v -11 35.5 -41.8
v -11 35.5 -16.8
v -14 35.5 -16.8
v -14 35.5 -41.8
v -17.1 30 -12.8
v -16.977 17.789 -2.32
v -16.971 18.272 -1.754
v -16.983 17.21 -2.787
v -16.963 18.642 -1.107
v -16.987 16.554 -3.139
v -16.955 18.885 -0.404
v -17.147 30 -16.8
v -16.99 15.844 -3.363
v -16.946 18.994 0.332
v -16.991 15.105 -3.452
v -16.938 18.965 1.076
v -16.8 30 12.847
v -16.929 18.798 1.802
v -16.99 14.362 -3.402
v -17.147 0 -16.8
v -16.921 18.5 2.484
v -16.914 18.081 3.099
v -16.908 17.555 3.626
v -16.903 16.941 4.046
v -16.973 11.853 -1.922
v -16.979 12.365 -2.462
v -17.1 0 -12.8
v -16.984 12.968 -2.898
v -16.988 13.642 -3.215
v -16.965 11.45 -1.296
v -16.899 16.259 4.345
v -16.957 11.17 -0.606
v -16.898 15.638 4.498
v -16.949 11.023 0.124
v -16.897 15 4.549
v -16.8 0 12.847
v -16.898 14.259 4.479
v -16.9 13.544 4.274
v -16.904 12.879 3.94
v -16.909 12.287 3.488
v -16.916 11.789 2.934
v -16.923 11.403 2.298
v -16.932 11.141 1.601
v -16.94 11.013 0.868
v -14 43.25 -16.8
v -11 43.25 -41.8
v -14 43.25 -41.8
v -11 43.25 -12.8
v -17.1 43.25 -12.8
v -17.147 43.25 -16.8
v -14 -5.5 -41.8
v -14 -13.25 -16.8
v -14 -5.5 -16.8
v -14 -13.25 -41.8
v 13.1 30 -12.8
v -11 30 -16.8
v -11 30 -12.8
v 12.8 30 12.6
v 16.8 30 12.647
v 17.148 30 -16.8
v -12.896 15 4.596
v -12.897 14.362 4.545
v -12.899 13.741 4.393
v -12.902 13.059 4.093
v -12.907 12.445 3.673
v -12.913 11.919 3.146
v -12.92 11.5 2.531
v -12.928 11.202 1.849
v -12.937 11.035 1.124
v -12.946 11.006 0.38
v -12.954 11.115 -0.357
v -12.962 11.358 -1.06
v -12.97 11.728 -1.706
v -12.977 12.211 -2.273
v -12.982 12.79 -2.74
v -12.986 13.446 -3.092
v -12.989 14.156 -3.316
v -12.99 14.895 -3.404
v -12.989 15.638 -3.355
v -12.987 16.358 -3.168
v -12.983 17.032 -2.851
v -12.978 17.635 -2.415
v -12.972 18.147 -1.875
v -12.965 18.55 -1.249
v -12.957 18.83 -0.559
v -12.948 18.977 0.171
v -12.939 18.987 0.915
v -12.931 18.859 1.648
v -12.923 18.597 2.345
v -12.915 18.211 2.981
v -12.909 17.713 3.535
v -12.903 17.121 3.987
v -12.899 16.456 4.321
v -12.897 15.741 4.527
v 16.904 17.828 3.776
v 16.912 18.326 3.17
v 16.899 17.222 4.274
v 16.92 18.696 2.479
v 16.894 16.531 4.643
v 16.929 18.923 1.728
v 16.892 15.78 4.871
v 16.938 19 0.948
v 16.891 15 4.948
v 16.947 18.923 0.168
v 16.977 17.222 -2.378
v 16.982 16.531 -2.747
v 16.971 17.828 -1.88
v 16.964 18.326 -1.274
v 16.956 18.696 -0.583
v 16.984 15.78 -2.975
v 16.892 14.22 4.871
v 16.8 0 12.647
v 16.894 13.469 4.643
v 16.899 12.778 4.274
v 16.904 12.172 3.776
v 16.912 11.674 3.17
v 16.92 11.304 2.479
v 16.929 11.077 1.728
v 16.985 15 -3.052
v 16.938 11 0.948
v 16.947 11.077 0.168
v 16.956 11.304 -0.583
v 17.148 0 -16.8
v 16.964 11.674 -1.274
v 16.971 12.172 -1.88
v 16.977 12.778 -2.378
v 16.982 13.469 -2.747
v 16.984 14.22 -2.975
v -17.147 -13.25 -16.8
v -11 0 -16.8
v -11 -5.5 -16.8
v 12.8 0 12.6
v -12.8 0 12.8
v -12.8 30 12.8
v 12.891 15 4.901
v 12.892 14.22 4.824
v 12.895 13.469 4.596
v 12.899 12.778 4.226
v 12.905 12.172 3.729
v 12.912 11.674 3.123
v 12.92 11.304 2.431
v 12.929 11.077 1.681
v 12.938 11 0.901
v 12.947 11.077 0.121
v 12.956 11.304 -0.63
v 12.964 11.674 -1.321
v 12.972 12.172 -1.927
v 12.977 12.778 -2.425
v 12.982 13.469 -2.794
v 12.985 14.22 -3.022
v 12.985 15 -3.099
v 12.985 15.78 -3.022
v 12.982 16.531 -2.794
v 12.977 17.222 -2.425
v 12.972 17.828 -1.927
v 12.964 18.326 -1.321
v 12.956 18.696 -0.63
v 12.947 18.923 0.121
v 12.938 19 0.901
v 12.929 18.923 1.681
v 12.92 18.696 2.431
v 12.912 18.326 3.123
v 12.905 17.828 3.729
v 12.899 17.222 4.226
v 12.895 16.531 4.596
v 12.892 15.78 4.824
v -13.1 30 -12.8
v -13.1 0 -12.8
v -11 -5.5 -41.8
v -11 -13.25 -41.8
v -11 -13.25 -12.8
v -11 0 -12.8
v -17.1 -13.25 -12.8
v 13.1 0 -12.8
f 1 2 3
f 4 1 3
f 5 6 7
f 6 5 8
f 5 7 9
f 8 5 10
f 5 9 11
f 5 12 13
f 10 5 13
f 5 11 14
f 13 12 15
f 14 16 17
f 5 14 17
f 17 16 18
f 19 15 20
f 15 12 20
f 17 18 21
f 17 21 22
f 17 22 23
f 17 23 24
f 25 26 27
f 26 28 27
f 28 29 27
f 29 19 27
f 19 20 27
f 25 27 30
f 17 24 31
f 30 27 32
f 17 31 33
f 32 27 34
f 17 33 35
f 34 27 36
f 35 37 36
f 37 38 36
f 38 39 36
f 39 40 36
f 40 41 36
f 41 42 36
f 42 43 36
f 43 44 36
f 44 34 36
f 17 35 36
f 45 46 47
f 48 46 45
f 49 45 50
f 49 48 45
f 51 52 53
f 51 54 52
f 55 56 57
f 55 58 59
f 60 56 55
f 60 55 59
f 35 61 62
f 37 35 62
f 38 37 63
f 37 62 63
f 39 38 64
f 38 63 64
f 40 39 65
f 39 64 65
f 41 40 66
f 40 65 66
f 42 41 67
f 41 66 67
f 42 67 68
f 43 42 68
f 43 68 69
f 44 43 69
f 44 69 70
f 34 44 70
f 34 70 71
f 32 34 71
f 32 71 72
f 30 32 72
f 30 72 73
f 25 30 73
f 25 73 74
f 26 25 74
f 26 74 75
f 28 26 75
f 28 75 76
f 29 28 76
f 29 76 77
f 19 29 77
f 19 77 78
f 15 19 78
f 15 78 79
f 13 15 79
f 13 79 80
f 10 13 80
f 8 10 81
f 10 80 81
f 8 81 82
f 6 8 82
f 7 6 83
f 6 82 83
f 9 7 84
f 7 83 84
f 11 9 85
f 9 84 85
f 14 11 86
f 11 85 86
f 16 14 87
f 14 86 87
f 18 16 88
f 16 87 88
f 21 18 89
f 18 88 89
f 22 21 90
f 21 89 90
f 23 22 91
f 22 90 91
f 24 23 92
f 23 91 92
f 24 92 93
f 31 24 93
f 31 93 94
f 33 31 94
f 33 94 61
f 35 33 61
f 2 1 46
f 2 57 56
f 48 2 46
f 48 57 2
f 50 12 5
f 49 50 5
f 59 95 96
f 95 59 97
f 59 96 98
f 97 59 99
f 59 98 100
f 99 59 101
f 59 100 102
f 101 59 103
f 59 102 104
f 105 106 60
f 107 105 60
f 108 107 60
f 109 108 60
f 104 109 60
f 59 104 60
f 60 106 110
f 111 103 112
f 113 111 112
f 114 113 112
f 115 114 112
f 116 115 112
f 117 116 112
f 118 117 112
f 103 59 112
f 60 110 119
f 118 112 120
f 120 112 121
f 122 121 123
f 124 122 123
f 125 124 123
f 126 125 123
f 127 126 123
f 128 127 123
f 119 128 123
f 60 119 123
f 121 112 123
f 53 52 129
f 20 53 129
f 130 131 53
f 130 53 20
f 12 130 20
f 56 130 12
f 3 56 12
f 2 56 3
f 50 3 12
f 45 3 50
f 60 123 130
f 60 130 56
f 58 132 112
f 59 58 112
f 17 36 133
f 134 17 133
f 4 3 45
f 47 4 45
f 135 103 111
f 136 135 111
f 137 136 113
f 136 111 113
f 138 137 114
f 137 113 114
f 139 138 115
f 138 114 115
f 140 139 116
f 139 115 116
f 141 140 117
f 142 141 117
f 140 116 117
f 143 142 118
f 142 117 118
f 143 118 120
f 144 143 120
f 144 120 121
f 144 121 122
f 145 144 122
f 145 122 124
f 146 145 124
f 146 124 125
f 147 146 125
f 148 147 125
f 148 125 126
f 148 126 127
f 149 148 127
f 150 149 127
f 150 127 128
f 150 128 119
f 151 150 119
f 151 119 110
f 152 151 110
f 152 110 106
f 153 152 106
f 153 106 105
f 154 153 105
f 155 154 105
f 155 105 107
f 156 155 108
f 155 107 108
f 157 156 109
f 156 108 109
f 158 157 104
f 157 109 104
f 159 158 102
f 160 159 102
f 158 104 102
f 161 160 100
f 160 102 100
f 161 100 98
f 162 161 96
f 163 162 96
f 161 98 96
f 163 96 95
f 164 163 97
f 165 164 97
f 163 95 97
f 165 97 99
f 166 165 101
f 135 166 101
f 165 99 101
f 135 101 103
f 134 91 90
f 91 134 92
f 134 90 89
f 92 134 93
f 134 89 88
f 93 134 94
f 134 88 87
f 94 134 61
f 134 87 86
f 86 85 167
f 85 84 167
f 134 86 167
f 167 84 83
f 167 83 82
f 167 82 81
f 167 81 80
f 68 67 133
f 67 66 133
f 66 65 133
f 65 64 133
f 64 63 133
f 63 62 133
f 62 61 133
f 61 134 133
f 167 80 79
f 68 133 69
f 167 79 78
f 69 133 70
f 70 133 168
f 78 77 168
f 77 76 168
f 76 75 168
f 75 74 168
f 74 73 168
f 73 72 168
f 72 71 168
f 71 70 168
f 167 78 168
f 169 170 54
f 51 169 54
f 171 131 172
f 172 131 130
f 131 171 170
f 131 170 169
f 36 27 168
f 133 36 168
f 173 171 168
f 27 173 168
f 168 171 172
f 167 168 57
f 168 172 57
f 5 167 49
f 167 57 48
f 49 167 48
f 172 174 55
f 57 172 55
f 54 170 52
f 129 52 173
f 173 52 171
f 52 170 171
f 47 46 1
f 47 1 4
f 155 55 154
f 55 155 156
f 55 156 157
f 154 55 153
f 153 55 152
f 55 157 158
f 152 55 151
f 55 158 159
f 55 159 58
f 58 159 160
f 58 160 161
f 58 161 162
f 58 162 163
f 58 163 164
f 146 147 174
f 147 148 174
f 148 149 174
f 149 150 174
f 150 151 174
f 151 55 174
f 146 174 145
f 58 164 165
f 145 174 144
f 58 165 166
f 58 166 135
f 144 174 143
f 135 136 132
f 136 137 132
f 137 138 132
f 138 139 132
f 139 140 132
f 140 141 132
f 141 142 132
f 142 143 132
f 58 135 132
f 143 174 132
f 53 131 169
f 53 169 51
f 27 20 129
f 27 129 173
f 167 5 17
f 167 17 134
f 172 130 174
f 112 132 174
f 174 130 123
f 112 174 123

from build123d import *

# Parameters (mm, degrees)
BOSS_EXTRUDE1_DEPTH      = 30
SKETCH3_R                = 4
CUT_EXTRUDE1_DEPTH       = 40
SKETCH4_W                = 3
SKETCH4_H                = 41
BOSS_EXTRUDE2_DEPTH      = 4
BOSS_EXTRUDE3_DEPTH      = 25
BOSS_EXTRUDE3_DEPTH_BACK = 4
SKETCH5_W                = 3
SKETCH5_H                = 7.75
BOSS_EXTRUDE4_REACH      = 69.734
SKETCH6_W                = 4
SKETCH6_H                = 56.5


with BuildPart() as part:
    # Sketch1 → Boss-Extrude1 (new body)
    with BuildSketch(Plane(origin=(0, 0, 0), x_dir=(1, 0, 0), z_dir=(0, 1, 0))):
        Polygon((-12.8, -12.8), (-13.1, 12.8), (13.1, 12.8), (12.8, -12.6), (16.799721029, -12.6472408), (17.147523085, 16.8), (-17.147149649, 16.8), (-16.79972537, -12.846871782), align=None)
    extrude(amount=BOSS_EXTRUDE1_DEPTH)

    # Sketch3 → Cut-Extrude1 (cut)
    with BuildSketch(Plane(origin=(16.946733814, 0, 0.200158273), x_dir=(0.011810199887684227, 0, -0.9999302571572745), z_dir=(0.9999302571572745, 0, 0.011810199887684227))):
        with Locations(Location((-0.747950682, 15, 0), (0, 0, 180))):
            Circle(SKETCH3_R)
    extrude(amount=-CUT_EXTRUDE1_DEPTH, mode=Mode.SUBTRACT)

    # Sketch4 → Boss-Extrude2 (add)
    with BuildSketch(Plane(origin=(0, 0, -16.8), x_dir=(-1, 0, 0), z_dir=(0, 0, -1))):
        with Locations((12.499813282, 15)):
            Rectangle(SKETCH4_W, SKETCH4_H)
    extrude(amount=-BOSS_EXTRUDE2_DEPTH)

    # Sketch5 → Boss-Extrude3 (add, two sides: drawn at the far end of the back side and taken through both)
    with BuildSketch(Plane(origin=(0, 0, -16.8), x_dir=(-1, 0, 0), z_dir=(0, 0, -1)).offset(-BOSS_EXTRUDE3_DEPTH_BACK)):
        with Locations((12.499813282, 39.375)):
            Rectangle(SKETCH5_W, SKETCH5_H)
        with Locations((12.499813282, -9.375)):
            Rectangle(SKETCH5_W, SKETCH5_H)
    extrude(amount=BOSS_EXTRUDE3_DEPTH + BOSS_EXTRUDE3_DEPTH_BACK)

    # Boss-Extrude4: up to this plane
    boss_extrude4_end = Plane(origin=(-16.79972537, 30, 12.846871782), z_dir=(0.9999313425206403, 0, -0.01171794542016394))
    # Sketch6 → Boss-Extrude4 (add, up to the surface)
    with BuildSketch(Plane.ZY.offset(13.999813282), mode=Mode.PRIVATE) as boss_extrude4_sk1:
        with Locations((-14.8, 15)):
            Rectangle(SKETCH6_W, SKETCH6_H)
    boss_extrude4_tool1 = split(extrude(boss_extrude4_sk1.sketch, amount=BOSS_EXTRUDE4_REACH, mode=Mode.PRIVATE), bisect_by=boss_extrude4_end, keep=Keep.BOTH, mode=Mode.PRIVATE)
    add(boss_extrude4_tool1.solids().sort_by_distance((-13.999813, 15, -14.8))[0])


solid = part.part
